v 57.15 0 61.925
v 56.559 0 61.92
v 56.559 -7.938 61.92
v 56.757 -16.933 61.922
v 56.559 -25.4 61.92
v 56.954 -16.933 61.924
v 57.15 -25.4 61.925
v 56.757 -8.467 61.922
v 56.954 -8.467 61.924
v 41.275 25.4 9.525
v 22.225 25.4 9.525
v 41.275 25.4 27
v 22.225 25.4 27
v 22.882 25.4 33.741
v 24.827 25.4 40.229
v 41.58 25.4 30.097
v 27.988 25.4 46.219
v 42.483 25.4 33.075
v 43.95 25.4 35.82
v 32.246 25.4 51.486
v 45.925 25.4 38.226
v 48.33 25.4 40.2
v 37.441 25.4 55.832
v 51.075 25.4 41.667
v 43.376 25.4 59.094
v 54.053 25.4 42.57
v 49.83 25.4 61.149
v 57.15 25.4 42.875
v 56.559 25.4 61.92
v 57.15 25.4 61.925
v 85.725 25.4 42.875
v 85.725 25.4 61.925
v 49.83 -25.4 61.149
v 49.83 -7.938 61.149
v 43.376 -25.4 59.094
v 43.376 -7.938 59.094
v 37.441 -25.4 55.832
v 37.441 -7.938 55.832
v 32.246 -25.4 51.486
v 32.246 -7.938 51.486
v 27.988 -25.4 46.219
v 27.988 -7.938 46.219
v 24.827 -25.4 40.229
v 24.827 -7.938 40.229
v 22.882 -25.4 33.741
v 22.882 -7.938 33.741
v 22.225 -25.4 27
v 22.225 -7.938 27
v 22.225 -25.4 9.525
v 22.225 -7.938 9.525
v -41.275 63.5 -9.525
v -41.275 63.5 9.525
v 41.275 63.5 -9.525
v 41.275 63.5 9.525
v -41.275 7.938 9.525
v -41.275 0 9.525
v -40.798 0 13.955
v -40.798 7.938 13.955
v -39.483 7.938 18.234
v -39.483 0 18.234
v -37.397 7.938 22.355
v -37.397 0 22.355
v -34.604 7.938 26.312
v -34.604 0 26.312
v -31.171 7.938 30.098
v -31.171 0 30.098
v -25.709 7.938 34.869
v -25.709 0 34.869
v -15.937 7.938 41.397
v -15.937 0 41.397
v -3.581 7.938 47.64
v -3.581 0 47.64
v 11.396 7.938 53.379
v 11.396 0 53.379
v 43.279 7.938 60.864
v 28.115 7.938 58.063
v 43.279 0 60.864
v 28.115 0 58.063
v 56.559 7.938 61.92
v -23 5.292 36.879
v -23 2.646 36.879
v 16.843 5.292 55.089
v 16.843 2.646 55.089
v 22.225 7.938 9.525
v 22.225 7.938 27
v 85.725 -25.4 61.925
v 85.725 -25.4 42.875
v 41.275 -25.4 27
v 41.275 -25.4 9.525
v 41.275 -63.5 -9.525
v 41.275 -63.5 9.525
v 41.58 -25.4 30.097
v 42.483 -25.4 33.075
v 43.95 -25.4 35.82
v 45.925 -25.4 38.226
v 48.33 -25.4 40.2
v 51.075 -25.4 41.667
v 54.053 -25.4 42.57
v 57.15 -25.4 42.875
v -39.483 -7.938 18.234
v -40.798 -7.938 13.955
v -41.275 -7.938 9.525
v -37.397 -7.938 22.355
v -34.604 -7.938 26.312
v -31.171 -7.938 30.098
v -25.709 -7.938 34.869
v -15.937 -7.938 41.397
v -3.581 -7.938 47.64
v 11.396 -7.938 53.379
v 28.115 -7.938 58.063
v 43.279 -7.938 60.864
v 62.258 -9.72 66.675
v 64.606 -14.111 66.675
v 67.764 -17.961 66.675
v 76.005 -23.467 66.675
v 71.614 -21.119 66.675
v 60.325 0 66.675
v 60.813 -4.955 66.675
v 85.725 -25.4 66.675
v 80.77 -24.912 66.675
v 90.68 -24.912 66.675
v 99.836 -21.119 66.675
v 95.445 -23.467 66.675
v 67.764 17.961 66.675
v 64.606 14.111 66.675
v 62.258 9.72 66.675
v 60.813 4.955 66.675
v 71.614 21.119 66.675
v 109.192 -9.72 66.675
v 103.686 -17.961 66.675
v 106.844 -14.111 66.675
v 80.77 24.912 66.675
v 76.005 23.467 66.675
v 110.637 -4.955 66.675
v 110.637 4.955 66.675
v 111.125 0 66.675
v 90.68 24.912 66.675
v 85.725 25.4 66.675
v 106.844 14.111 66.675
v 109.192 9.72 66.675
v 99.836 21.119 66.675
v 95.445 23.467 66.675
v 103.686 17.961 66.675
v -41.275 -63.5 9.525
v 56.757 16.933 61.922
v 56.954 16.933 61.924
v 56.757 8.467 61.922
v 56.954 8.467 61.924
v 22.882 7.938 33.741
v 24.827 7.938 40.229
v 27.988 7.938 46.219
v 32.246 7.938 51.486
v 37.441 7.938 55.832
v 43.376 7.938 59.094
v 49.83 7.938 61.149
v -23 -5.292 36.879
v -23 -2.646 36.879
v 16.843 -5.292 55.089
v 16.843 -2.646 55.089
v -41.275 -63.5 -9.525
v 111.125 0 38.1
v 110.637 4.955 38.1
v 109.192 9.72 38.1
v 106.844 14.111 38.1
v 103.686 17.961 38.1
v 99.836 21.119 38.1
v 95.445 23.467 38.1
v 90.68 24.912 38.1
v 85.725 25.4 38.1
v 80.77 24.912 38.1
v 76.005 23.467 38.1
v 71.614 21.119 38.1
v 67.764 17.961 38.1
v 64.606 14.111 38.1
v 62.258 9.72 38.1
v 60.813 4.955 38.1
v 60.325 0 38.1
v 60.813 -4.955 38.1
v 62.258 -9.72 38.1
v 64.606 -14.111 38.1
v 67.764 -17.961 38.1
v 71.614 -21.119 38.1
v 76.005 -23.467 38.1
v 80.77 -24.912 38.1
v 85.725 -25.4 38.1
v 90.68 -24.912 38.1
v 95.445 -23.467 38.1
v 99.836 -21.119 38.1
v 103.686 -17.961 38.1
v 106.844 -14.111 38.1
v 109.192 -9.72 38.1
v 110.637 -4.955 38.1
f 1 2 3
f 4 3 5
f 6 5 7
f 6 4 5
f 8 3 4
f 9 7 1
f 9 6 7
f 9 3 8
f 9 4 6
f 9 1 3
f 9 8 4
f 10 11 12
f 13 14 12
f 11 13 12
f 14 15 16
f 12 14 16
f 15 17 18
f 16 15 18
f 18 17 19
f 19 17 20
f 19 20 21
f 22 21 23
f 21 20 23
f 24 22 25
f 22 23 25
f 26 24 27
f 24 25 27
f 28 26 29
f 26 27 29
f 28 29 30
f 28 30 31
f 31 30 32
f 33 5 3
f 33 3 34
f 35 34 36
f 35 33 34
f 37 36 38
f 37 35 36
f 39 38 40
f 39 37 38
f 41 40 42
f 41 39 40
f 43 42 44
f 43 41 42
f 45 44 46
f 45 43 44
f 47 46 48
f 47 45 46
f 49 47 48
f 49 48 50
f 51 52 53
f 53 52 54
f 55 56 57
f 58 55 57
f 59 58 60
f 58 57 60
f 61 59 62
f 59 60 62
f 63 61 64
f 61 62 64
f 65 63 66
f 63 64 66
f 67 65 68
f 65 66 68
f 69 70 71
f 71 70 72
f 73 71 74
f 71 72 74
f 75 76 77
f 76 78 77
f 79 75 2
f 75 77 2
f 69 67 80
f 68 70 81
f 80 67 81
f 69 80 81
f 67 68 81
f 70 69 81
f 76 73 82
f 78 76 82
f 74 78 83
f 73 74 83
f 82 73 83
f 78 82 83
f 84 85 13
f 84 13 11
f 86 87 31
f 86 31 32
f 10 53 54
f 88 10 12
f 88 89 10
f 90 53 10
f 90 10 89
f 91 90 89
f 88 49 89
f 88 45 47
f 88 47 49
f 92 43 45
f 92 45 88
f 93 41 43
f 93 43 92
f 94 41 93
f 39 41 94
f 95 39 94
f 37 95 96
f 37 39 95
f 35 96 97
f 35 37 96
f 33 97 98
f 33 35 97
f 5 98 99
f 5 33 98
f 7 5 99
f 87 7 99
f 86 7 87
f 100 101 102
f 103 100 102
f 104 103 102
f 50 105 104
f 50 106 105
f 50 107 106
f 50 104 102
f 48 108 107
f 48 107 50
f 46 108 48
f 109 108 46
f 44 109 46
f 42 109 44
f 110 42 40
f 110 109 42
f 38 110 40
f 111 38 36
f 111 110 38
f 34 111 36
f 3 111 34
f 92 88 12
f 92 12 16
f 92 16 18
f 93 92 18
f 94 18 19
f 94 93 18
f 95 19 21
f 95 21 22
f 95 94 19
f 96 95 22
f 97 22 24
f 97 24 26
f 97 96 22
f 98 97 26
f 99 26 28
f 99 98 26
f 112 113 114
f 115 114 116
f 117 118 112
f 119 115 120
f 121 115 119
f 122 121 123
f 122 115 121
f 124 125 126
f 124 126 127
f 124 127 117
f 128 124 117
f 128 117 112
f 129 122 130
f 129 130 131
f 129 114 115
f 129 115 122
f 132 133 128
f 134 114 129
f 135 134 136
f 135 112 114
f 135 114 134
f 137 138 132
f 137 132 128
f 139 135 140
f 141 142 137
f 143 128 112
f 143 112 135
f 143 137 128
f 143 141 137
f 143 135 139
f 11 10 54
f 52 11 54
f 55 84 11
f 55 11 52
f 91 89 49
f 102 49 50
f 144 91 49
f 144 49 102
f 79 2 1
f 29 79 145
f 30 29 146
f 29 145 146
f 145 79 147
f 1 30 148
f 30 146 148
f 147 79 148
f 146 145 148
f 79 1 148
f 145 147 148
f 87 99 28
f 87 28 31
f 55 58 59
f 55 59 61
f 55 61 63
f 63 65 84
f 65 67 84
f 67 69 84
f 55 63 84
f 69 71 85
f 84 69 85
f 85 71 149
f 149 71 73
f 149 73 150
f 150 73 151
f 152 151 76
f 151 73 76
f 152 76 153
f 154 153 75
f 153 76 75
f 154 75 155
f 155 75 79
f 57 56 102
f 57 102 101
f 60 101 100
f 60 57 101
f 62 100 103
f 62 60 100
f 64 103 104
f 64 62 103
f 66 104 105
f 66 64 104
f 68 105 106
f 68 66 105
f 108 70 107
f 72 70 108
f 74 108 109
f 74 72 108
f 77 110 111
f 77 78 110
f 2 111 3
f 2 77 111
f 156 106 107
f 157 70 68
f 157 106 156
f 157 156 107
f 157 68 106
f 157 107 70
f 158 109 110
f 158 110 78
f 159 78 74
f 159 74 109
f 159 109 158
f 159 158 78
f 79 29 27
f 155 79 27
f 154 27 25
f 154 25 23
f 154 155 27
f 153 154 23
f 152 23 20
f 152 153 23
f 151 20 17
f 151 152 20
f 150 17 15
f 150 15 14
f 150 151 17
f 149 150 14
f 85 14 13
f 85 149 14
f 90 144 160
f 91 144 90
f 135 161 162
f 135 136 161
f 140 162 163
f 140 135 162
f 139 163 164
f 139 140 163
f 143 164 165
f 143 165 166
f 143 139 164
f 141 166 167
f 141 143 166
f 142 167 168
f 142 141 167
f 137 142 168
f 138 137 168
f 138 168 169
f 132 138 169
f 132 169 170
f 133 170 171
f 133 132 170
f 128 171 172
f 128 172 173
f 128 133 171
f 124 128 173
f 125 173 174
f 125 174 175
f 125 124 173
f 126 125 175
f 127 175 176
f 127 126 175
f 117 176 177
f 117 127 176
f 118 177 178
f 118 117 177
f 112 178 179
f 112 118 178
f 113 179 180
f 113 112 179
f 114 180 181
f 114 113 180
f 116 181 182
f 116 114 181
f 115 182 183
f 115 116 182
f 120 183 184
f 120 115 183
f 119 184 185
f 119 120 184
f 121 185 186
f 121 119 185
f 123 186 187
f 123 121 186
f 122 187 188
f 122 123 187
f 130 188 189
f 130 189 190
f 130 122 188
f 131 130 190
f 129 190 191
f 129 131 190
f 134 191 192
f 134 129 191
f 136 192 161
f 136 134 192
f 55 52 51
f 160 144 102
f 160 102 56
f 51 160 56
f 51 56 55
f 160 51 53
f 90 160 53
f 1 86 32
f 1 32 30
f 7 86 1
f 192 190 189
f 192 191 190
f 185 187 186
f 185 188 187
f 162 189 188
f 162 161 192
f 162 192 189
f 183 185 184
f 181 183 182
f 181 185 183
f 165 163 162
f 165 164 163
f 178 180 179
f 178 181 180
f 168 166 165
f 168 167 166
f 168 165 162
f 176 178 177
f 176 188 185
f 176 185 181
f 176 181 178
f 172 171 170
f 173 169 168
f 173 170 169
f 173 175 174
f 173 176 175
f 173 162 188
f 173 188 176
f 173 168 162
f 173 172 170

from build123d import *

# Parameters (mm, degrees)
F1_DEPTH = 63.5
F0_W     = 25.4
F0_H     = 19.05
F2_DEPTH = 25.4
F3_DEPTH = 7.9375


with BuildPart() as f1:
    # F0 (on Front) → F1 (new body, symmetric)
    with BuildSketch(Plane.XZ):
        Polygon((41.275, -9.525), (41.275, 9.525), (22.225, 9.525), (-41.275, 9.525), (-41.275, -9.525), align=None)
    extrude(amount=F1_DEPTH, both=True)

    # F0 (on Front) → F2 (join, symmetric)
    with BuildSketch(Plane.XZ):
        with BuildLine():
            Line((22.225, 9.525), (41.275, 9.525))
            Line((41.275, 9.525), (41.275, 27.0002))
            ThreePointArc((41.275, 27.0002), (45.9246798487, 38.2255201513), (57.15, 42.8752))
            Line((57.15, 42.8752), (60.325, 42.8752))
            Line((60.325, 42.8752), (60.325, 61.9252))
            Line((60.325, 61.9252), (57.15, 61.9252))
            add(Edge.make_bspline(
                [(56.558689265, 61.9201939378), (56.7570255825, 61.9226276245), (56.9541366131, 61.9242970793), (57.15, 61.9252)],
                knots=[110.8265178174, 110.8265178174, 110.8265178174, 110.8265178174, 111.5045361635, 111.5045361635, 111.5045361635, 111.5045361635], degree=3))
            ThreePointArc((56.558689265, 61.9201939378), (32.2461132309, 51.4859519548), (22.225, 27.0002))
            Line((22.225, 27.0002), (22.225, 9.525))
        make_face()
        with Locations((73.025, 52.4002)):
            Rectangle(F0_W, F0_H)
    extrude(amount=F2_DEPTH, both=True)

    # F0 (on Front) → F3 (join, symmetric)
    with BuildSketch(Plane.XZ):
        with BuildLine():
            Line((-41.275, 9.525), (22.225, 9.525))
            Line((22.225, 9.525), (22.225, 27.0002))
            ThreePointArc((22.225, 27.0002), (32.2461132309, 51.4859519548), (56.558689265, 61.9201939378))
            add(Edge.make_bspline(
                [(-41.275, 9.525), (-41.0172984332, 40.7058168065), (24.1393254559, 61.5223919803), (56.558689265, 61.9201939378)],
                knots=[0, 0, 0, 0, 110.8265178174, 110.8265178174, 110.8265178174, 110.8265178174], degree=3))
        make_face()
    extrude(amount=F3_DEPTH, both=True)


with BuildPart() as f4:
    # F0 (on Front) → F4 (revolve)
    with BuildSketch(Plane.XZ):
        Polygon((85.725, 61.9252), (85.725, 42.8752), (85.725, 38.1), (111.125, 38.1), (111.125, 66.675), (85.725, 66.675), align=None)
    revolve(axis=Axis((85.725, 0, 52.3875), (0, 0, 1)))


solid = Compound([f1.part, f4.part])
